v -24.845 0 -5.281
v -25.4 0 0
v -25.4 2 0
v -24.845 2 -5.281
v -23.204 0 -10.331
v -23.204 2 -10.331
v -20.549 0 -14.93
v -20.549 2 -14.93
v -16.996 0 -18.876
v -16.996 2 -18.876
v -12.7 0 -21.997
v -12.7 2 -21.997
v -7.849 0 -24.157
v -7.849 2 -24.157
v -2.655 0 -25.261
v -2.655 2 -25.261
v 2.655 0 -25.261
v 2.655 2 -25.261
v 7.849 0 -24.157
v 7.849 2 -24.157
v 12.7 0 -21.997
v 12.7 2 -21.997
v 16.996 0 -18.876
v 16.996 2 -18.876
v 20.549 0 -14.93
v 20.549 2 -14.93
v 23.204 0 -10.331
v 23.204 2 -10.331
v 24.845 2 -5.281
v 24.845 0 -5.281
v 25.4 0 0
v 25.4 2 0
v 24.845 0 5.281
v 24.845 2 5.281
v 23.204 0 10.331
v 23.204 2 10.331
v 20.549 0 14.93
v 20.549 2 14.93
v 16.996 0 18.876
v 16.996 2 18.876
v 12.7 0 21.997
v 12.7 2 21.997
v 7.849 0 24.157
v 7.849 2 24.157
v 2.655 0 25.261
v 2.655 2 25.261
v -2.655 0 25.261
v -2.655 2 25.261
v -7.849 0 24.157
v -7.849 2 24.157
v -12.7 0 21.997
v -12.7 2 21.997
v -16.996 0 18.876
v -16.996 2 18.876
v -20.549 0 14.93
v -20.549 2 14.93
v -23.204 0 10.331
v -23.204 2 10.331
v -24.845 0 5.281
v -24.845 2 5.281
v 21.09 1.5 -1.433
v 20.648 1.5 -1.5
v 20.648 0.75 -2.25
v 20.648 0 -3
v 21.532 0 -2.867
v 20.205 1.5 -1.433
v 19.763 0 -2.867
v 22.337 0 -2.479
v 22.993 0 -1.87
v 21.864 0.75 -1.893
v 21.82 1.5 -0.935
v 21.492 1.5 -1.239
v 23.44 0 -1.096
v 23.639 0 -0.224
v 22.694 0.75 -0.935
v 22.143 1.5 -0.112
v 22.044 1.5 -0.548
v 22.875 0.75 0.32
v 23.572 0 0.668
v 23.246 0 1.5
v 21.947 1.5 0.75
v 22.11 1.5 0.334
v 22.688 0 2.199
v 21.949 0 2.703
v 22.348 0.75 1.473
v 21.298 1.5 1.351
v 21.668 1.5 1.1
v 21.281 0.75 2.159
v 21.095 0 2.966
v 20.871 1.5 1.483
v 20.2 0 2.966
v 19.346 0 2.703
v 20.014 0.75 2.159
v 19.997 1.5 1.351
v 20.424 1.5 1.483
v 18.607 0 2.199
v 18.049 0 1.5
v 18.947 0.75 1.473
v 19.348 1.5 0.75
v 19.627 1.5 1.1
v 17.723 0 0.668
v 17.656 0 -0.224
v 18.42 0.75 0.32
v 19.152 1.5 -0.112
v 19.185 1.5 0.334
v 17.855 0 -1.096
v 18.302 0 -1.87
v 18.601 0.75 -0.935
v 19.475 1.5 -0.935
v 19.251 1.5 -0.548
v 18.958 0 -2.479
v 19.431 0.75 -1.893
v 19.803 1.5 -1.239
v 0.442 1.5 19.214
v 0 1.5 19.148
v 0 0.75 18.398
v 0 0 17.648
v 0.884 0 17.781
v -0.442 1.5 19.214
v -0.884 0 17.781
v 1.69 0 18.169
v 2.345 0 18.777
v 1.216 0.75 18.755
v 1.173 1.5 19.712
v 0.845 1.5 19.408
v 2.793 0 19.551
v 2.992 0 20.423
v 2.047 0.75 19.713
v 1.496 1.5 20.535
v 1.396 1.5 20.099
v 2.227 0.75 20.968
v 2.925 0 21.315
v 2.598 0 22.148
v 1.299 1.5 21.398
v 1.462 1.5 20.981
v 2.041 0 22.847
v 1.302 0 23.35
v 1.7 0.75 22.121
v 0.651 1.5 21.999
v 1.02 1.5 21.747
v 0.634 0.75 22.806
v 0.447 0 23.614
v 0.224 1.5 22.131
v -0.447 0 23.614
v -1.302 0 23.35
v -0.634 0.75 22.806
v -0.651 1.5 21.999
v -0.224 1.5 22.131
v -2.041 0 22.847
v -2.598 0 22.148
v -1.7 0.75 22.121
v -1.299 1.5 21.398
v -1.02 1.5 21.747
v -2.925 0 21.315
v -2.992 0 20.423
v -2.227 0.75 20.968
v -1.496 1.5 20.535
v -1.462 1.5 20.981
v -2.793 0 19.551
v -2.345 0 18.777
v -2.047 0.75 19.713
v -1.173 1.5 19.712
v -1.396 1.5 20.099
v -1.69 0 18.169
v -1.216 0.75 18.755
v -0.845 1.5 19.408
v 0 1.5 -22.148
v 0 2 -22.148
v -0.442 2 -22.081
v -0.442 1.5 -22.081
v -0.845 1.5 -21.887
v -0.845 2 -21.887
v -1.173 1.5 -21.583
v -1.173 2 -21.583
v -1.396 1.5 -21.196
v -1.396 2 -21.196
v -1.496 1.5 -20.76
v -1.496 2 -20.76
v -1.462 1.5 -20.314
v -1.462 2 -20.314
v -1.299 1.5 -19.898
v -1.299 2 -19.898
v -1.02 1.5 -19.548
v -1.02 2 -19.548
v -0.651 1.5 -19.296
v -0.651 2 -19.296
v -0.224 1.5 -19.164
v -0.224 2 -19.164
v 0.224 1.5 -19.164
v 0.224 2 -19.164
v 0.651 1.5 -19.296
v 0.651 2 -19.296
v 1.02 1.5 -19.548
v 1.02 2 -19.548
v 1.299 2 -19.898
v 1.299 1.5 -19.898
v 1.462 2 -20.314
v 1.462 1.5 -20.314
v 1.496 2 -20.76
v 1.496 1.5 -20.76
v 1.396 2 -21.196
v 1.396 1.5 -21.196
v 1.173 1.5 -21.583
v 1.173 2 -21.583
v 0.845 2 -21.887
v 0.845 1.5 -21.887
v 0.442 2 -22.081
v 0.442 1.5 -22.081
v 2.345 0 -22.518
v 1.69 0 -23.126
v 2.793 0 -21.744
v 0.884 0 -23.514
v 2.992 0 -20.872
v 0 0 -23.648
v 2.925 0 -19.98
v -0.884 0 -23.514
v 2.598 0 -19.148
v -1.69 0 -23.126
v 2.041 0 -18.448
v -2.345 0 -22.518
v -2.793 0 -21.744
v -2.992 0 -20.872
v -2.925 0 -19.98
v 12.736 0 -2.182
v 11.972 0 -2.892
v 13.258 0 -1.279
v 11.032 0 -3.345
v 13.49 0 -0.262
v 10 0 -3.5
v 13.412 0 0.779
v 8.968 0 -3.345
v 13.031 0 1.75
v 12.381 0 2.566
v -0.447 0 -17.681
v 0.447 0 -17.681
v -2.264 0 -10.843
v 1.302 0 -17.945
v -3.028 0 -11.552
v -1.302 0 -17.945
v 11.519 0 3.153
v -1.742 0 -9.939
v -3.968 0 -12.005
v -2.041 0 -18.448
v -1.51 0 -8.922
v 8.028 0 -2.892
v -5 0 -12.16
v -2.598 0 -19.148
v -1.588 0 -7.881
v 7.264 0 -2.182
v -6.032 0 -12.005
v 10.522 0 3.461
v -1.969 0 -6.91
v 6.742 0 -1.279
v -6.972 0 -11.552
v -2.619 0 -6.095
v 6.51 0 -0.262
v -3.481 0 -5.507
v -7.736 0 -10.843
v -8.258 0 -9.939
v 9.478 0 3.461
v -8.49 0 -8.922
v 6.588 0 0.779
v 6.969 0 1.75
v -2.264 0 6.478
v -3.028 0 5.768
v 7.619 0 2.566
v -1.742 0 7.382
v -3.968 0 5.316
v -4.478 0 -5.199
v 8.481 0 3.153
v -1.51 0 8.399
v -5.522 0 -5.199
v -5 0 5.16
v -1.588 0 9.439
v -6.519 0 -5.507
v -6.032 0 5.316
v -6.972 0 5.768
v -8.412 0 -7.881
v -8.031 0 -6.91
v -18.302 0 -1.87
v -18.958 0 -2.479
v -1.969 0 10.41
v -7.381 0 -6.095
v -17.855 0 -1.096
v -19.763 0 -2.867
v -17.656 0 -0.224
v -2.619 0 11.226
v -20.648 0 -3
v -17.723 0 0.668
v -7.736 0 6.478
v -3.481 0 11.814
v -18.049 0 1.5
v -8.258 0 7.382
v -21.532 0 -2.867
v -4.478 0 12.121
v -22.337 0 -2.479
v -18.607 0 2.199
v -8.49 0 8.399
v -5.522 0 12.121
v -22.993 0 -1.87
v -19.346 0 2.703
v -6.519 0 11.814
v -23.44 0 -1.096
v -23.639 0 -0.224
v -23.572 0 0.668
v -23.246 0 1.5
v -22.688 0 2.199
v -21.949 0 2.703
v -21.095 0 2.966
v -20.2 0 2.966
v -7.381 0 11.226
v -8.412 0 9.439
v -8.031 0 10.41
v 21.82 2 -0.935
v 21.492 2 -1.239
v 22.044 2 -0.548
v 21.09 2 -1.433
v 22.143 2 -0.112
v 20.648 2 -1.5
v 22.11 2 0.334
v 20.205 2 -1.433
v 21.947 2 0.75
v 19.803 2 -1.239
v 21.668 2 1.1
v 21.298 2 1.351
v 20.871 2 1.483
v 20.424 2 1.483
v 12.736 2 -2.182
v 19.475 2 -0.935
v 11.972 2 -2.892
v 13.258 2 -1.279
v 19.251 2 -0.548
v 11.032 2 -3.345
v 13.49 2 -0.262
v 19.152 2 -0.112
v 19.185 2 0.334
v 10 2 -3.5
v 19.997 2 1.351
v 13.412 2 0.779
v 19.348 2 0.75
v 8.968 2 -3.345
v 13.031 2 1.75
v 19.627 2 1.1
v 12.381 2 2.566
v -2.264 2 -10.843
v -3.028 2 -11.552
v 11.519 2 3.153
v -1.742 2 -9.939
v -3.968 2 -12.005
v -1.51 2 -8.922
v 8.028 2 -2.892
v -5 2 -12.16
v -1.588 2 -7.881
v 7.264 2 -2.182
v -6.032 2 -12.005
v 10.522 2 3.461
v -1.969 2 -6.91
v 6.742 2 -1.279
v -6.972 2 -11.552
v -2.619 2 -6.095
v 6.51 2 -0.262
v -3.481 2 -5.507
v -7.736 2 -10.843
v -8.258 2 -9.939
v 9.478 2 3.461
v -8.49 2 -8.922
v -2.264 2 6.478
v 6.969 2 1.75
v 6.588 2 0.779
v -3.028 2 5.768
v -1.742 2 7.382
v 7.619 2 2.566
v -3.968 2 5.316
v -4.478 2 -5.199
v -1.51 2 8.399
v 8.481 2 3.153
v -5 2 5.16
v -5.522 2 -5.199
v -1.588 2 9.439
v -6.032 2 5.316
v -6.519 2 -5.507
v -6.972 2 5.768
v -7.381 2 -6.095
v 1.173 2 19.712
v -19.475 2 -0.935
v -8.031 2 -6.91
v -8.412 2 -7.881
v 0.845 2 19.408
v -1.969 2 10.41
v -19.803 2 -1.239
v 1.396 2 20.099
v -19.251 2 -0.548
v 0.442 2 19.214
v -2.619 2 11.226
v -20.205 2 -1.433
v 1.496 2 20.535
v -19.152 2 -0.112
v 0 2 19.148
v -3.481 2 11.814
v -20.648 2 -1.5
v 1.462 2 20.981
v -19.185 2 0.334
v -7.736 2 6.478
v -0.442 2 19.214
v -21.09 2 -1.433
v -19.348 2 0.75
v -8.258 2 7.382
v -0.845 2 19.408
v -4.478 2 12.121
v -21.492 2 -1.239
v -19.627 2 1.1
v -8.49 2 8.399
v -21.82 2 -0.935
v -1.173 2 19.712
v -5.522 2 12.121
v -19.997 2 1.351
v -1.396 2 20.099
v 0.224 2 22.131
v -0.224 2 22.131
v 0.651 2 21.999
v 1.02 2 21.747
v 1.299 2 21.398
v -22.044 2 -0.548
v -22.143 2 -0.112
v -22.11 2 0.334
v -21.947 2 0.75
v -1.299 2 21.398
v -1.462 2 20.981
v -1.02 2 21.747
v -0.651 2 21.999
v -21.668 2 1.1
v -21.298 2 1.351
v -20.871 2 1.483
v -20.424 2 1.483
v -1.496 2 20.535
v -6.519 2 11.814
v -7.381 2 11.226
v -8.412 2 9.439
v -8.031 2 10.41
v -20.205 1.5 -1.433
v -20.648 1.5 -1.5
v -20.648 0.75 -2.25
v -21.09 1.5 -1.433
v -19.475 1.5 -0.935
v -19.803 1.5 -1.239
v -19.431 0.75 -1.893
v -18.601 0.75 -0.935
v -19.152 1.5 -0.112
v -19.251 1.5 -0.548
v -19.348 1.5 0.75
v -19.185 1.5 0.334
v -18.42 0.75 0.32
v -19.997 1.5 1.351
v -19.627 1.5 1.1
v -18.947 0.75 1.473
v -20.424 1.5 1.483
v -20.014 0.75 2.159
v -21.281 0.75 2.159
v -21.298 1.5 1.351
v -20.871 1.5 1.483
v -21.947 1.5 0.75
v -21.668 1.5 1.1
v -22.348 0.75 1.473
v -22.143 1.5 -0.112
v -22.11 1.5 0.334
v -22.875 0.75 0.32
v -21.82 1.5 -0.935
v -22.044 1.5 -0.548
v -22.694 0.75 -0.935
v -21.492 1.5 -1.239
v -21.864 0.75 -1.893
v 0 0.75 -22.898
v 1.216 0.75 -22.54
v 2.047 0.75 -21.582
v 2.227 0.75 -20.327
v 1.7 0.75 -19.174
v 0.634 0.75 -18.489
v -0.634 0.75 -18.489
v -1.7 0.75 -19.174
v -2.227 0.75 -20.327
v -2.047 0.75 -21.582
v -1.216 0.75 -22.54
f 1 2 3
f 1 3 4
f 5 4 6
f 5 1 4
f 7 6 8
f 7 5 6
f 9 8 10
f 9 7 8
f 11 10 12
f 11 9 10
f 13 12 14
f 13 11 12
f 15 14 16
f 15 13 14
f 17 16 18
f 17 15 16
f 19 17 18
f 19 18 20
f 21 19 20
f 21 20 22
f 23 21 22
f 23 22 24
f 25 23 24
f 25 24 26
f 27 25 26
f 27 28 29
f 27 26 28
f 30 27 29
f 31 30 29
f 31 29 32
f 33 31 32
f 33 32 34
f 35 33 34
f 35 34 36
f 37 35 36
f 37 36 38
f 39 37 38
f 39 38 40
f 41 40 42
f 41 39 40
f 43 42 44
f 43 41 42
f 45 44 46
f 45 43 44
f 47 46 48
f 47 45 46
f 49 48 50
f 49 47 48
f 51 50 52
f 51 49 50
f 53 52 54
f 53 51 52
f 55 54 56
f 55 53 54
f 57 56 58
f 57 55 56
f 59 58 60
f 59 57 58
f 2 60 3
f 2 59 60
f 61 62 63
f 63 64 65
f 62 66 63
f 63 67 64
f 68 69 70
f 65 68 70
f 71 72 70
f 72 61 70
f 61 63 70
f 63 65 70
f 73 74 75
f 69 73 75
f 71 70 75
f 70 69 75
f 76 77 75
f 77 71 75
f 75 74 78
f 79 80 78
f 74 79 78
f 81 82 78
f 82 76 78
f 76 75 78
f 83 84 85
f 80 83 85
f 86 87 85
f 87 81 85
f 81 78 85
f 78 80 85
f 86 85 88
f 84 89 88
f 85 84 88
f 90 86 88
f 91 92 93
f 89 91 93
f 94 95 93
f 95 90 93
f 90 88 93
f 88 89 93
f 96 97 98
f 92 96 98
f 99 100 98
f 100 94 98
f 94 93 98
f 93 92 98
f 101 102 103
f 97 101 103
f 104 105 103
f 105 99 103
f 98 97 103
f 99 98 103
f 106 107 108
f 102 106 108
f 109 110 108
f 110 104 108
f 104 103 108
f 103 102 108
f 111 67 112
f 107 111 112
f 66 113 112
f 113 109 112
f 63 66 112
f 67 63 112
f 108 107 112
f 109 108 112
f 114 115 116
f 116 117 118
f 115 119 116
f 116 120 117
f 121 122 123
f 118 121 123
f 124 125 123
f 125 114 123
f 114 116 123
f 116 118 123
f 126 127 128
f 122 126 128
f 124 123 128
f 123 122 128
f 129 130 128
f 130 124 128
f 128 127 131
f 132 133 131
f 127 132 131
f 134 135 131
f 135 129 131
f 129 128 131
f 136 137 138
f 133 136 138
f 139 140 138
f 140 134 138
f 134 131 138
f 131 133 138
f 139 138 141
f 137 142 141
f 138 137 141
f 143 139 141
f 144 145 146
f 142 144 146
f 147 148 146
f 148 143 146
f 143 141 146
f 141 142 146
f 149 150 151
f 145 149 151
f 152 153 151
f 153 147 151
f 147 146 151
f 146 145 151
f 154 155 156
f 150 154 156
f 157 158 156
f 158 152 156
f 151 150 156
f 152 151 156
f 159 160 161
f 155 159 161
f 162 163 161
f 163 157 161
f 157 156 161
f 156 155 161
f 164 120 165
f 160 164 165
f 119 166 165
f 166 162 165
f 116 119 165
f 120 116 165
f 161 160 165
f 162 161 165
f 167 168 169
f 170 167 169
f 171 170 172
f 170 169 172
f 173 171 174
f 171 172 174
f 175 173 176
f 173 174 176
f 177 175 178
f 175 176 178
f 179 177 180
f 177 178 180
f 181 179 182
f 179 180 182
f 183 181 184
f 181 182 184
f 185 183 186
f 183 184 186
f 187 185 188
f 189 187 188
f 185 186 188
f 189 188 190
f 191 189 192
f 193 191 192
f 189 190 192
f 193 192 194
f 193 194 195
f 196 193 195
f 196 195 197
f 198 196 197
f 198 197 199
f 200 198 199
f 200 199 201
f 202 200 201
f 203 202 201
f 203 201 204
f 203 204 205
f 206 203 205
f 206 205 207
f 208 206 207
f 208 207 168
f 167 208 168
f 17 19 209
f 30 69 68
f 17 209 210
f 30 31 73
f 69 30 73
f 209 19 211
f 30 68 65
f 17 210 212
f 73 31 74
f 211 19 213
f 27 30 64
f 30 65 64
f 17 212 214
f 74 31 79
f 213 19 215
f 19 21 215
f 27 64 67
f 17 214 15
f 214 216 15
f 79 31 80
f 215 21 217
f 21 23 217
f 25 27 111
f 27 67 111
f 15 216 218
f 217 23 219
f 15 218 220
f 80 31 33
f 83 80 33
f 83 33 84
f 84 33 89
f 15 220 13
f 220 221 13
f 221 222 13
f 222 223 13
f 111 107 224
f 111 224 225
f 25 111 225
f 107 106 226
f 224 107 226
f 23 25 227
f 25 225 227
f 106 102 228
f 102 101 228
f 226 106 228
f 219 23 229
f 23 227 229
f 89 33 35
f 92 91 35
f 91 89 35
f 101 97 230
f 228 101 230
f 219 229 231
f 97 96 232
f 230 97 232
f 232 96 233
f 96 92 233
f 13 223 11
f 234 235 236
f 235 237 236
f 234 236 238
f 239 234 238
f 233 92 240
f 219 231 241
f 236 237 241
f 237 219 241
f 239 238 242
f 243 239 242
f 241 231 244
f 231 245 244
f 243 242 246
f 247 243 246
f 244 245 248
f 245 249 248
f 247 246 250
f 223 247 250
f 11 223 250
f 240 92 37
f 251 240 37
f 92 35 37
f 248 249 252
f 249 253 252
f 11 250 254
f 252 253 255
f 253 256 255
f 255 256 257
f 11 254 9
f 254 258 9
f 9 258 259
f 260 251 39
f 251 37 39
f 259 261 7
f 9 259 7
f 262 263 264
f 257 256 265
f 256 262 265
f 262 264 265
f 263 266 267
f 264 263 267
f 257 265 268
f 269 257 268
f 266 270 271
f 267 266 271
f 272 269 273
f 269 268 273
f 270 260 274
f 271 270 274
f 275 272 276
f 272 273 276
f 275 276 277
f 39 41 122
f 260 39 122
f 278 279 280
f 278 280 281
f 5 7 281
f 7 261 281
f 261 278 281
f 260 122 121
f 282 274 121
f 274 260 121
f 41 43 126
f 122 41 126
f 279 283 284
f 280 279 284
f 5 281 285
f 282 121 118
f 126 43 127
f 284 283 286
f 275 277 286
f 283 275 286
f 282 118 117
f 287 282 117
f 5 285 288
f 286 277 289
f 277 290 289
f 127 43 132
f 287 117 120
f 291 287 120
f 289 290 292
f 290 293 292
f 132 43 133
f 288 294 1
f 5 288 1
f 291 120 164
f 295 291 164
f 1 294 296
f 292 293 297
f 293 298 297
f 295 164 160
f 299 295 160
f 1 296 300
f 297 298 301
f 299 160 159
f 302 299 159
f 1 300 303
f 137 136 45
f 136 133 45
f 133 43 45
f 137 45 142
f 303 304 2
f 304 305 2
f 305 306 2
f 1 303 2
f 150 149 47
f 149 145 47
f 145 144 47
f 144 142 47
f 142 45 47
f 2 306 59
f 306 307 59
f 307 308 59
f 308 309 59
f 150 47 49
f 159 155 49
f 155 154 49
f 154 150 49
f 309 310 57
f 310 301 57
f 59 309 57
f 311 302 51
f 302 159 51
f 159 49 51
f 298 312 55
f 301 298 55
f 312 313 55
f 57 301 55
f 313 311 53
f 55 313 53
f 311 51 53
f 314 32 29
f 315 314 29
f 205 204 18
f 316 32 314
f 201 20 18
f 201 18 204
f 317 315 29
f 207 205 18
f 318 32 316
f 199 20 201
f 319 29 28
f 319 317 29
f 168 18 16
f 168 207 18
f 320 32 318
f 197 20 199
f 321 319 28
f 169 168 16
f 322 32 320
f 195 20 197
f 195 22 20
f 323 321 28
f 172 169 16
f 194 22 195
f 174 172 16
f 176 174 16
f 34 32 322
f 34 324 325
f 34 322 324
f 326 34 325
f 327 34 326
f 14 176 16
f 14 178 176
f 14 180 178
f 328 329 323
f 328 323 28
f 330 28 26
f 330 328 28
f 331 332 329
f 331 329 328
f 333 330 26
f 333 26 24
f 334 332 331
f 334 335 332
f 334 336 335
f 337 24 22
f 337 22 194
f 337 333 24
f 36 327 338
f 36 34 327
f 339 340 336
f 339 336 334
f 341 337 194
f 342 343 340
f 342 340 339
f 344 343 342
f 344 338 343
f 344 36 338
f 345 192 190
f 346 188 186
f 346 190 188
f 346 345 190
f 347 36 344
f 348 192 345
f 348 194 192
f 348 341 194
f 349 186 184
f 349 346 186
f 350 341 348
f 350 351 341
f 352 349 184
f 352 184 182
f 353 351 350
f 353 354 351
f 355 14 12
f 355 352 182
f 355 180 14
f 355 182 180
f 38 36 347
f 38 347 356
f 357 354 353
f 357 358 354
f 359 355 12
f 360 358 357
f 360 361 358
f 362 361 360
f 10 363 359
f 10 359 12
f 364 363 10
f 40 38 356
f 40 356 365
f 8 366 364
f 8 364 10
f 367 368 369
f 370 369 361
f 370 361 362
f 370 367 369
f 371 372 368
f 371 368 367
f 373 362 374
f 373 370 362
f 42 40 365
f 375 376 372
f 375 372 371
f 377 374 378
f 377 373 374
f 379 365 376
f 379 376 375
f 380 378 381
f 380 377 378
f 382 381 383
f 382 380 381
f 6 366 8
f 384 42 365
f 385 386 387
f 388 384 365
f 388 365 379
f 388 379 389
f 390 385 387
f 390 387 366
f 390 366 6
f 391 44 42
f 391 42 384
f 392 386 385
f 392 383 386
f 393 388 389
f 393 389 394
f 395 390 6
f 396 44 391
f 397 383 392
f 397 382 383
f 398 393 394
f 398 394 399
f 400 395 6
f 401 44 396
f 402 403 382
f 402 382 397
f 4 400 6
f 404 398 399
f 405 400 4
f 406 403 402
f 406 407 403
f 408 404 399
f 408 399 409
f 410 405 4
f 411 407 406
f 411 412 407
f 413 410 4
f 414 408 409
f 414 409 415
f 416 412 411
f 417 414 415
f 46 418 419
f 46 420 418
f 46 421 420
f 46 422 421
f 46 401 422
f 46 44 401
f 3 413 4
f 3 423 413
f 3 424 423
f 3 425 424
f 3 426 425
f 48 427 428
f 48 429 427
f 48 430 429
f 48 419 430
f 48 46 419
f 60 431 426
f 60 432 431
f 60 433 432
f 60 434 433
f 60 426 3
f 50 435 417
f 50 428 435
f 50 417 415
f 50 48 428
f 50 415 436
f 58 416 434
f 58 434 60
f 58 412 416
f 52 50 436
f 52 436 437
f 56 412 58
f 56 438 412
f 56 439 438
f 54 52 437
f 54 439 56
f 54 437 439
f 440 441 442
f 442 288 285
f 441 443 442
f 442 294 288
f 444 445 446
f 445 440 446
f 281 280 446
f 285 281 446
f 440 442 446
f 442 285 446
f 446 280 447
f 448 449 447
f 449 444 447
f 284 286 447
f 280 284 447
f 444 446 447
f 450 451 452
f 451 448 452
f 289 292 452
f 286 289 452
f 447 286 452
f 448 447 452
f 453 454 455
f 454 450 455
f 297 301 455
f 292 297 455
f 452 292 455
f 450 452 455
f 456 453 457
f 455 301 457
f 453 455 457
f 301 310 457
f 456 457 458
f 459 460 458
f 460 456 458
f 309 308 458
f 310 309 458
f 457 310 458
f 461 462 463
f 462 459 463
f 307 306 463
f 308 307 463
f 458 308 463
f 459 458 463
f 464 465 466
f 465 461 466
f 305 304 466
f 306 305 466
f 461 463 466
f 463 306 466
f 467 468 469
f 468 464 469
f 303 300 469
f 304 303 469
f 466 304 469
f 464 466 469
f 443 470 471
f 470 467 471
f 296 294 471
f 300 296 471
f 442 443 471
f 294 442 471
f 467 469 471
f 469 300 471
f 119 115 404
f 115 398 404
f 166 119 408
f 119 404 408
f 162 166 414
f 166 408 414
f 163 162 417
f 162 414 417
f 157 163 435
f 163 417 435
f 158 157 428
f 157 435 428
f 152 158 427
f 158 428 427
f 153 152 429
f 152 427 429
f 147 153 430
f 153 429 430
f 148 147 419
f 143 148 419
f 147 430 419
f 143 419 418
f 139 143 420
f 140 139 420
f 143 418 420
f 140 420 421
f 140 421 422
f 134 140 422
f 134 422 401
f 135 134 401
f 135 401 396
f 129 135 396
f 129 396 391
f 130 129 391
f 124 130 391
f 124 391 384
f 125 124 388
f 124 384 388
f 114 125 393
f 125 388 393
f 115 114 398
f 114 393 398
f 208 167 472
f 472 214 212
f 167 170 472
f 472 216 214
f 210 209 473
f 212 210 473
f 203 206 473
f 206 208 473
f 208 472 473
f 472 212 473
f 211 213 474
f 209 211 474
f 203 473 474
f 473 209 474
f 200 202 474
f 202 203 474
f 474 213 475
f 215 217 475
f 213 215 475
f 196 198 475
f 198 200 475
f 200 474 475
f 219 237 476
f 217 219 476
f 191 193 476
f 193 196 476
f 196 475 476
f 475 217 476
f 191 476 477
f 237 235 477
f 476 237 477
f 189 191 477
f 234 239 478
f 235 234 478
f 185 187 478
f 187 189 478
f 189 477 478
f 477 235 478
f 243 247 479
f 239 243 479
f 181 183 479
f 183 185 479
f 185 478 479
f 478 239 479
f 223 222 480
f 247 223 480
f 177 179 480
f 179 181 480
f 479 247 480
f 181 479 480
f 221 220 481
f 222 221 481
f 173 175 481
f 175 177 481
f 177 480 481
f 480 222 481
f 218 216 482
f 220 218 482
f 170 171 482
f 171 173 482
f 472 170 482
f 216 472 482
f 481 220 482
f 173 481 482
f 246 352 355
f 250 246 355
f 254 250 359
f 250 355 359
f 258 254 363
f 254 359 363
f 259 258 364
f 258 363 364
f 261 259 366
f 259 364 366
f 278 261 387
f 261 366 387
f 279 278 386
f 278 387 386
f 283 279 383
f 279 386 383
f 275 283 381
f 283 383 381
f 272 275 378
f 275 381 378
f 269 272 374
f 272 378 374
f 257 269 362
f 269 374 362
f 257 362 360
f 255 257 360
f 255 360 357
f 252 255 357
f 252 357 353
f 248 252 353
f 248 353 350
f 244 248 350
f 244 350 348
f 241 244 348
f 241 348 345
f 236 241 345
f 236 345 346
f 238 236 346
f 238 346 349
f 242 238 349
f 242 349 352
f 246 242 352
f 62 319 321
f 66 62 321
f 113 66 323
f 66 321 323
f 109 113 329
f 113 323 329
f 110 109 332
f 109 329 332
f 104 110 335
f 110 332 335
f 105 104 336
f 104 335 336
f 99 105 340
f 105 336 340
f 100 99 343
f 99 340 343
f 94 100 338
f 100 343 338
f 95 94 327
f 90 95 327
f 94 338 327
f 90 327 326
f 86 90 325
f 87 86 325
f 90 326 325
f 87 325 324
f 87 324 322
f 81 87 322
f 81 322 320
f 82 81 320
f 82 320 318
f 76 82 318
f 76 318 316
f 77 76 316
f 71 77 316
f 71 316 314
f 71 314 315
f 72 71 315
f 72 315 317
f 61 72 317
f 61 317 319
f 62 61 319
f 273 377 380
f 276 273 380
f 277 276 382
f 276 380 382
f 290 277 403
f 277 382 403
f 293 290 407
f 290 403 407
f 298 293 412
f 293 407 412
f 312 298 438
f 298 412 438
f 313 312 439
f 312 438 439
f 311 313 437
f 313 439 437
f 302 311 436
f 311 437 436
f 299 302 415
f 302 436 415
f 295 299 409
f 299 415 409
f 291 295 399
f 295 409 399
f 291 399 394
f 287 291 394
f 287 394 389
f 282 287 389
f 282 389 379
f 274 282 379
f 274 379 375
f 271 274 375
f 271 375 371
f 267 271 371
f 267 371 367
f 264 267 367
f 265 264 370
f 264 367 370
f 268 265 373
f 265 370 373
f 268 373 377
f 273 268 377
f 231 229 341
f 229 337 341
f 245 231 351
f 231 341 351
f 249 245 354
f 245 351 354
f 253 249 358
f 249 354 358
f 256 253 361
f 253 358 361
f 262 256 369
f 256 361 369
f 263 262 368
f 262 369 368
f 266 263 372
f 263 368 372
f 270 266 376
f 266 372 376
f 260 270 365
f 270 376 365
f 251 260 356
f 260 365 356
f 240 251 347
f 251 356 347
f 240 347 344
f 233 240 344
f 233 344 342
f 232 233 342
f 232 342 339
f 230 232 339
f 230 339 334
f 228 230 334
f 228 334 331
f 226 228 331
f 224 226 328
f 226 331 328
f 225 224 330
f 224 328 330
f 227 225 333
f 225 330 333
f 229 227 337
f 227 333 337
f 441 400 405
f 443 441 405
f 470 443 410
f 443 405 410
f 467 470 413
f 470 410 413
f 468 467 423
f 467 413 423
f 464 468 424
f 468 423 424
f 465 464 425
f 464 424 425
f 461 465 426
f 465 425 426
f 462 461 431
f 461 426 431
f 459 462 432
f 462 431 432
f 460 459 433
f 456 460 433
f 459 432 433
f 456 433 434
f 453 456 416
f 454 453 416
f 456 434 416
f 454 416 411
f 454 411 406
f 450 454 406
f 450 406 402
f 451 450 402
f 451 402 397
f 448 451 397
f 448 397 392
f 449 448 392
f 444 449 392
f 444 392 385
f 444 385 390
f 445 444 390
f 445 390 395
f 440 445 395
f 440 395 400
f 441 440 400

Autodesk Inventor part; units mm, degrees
ref_plane "YZ Plane" through (0, 0, 0) normal (1, 0, 0) x (0, 1, 0)
ref_plane "XZ Plane" through (0, 0, 0) normal (0, 1, 0) x (-1, 0, 0)
ref_plane "XY Plane" through (0, 0, 0) normal (0, 0, 1) x (1, 0, 0)
sketch "Skizze1" plane through (0, 0, 0) normal (0, 1, 0) x (-1, 0, 0)
  circle A0 centre (0, 0) radius 25.4
  dimension "d0" = 50.8
extrude "Extrusion1" add sketch "Skizze1" along normal blind 2
sketch "Skizze2" plane through (0, 0, 0) normal (0, -1, 0) x (1, 0, 0)
  circle A0 centre (0, 0) radius 25.4 projected
  line L0 (-20.6475, 0) -> (0, 20.6475) construction
  line L1 (0, 20.6475) -> (20.6475, 0) construction
  line L2 (20.6475, 0) -> (0, -20.6475) construction
  line L3 (0, -20.6475) -> (-20.6475, 0) construction
  line L4 (0, 0) -> (10.3238, 10.3238) construction
  line L5 (0, 0) -> (-10.3238, 10.3238) construction
  circle A1 centre (0, 0) radius 25.4 construction
  line L6 (0, 0) -> (0, 25.4) construction
  point P0 (-20.6475, 0)
  point P1 (0, 20.6475)
  point P2 (20.6475, 0)
  dimension "d3" = 29.2
  dimension "d4" = 29.2
  dimension "d63" = 45
hole "Bohrung1" at (-20.6475, 0, 0) at (0, 0, 20.6475) at (20.6475, 0, 0) at (0, 0, -20.6475) direction (0, 1, 0) diameter 3 end through all countersink diameter 6 countersink angle 90
sketch "Skizze7" plane through (0, 0, 0) normal (0, -1, 0) x (1, 0, 0)
  circle A0 centre (0, 0) radius 25.4 construction
  circle A1 centre (0, 0) radius 10 construction
  line L0 (0, 0) -> (10, 0) construction
  circle A2 centre (0, 0) radius 10 construction
  line L1 (0, 0) -> (-5, 8.6603) construction
  circle A3 centre (0, 0) radius 10 construction
  line L2 (0, 0) -> (-5, -8.6603) construction
  dimension "d68" = 20
  dimension "d71" = 360
hole "Bohrung3" at (-5, 0, 8.6603) at (10, 0, 0) at (-5, 0, -8.6603) direction (0, 1, 0) diameter 7 end through all
properties part number "anschluss_daten"
